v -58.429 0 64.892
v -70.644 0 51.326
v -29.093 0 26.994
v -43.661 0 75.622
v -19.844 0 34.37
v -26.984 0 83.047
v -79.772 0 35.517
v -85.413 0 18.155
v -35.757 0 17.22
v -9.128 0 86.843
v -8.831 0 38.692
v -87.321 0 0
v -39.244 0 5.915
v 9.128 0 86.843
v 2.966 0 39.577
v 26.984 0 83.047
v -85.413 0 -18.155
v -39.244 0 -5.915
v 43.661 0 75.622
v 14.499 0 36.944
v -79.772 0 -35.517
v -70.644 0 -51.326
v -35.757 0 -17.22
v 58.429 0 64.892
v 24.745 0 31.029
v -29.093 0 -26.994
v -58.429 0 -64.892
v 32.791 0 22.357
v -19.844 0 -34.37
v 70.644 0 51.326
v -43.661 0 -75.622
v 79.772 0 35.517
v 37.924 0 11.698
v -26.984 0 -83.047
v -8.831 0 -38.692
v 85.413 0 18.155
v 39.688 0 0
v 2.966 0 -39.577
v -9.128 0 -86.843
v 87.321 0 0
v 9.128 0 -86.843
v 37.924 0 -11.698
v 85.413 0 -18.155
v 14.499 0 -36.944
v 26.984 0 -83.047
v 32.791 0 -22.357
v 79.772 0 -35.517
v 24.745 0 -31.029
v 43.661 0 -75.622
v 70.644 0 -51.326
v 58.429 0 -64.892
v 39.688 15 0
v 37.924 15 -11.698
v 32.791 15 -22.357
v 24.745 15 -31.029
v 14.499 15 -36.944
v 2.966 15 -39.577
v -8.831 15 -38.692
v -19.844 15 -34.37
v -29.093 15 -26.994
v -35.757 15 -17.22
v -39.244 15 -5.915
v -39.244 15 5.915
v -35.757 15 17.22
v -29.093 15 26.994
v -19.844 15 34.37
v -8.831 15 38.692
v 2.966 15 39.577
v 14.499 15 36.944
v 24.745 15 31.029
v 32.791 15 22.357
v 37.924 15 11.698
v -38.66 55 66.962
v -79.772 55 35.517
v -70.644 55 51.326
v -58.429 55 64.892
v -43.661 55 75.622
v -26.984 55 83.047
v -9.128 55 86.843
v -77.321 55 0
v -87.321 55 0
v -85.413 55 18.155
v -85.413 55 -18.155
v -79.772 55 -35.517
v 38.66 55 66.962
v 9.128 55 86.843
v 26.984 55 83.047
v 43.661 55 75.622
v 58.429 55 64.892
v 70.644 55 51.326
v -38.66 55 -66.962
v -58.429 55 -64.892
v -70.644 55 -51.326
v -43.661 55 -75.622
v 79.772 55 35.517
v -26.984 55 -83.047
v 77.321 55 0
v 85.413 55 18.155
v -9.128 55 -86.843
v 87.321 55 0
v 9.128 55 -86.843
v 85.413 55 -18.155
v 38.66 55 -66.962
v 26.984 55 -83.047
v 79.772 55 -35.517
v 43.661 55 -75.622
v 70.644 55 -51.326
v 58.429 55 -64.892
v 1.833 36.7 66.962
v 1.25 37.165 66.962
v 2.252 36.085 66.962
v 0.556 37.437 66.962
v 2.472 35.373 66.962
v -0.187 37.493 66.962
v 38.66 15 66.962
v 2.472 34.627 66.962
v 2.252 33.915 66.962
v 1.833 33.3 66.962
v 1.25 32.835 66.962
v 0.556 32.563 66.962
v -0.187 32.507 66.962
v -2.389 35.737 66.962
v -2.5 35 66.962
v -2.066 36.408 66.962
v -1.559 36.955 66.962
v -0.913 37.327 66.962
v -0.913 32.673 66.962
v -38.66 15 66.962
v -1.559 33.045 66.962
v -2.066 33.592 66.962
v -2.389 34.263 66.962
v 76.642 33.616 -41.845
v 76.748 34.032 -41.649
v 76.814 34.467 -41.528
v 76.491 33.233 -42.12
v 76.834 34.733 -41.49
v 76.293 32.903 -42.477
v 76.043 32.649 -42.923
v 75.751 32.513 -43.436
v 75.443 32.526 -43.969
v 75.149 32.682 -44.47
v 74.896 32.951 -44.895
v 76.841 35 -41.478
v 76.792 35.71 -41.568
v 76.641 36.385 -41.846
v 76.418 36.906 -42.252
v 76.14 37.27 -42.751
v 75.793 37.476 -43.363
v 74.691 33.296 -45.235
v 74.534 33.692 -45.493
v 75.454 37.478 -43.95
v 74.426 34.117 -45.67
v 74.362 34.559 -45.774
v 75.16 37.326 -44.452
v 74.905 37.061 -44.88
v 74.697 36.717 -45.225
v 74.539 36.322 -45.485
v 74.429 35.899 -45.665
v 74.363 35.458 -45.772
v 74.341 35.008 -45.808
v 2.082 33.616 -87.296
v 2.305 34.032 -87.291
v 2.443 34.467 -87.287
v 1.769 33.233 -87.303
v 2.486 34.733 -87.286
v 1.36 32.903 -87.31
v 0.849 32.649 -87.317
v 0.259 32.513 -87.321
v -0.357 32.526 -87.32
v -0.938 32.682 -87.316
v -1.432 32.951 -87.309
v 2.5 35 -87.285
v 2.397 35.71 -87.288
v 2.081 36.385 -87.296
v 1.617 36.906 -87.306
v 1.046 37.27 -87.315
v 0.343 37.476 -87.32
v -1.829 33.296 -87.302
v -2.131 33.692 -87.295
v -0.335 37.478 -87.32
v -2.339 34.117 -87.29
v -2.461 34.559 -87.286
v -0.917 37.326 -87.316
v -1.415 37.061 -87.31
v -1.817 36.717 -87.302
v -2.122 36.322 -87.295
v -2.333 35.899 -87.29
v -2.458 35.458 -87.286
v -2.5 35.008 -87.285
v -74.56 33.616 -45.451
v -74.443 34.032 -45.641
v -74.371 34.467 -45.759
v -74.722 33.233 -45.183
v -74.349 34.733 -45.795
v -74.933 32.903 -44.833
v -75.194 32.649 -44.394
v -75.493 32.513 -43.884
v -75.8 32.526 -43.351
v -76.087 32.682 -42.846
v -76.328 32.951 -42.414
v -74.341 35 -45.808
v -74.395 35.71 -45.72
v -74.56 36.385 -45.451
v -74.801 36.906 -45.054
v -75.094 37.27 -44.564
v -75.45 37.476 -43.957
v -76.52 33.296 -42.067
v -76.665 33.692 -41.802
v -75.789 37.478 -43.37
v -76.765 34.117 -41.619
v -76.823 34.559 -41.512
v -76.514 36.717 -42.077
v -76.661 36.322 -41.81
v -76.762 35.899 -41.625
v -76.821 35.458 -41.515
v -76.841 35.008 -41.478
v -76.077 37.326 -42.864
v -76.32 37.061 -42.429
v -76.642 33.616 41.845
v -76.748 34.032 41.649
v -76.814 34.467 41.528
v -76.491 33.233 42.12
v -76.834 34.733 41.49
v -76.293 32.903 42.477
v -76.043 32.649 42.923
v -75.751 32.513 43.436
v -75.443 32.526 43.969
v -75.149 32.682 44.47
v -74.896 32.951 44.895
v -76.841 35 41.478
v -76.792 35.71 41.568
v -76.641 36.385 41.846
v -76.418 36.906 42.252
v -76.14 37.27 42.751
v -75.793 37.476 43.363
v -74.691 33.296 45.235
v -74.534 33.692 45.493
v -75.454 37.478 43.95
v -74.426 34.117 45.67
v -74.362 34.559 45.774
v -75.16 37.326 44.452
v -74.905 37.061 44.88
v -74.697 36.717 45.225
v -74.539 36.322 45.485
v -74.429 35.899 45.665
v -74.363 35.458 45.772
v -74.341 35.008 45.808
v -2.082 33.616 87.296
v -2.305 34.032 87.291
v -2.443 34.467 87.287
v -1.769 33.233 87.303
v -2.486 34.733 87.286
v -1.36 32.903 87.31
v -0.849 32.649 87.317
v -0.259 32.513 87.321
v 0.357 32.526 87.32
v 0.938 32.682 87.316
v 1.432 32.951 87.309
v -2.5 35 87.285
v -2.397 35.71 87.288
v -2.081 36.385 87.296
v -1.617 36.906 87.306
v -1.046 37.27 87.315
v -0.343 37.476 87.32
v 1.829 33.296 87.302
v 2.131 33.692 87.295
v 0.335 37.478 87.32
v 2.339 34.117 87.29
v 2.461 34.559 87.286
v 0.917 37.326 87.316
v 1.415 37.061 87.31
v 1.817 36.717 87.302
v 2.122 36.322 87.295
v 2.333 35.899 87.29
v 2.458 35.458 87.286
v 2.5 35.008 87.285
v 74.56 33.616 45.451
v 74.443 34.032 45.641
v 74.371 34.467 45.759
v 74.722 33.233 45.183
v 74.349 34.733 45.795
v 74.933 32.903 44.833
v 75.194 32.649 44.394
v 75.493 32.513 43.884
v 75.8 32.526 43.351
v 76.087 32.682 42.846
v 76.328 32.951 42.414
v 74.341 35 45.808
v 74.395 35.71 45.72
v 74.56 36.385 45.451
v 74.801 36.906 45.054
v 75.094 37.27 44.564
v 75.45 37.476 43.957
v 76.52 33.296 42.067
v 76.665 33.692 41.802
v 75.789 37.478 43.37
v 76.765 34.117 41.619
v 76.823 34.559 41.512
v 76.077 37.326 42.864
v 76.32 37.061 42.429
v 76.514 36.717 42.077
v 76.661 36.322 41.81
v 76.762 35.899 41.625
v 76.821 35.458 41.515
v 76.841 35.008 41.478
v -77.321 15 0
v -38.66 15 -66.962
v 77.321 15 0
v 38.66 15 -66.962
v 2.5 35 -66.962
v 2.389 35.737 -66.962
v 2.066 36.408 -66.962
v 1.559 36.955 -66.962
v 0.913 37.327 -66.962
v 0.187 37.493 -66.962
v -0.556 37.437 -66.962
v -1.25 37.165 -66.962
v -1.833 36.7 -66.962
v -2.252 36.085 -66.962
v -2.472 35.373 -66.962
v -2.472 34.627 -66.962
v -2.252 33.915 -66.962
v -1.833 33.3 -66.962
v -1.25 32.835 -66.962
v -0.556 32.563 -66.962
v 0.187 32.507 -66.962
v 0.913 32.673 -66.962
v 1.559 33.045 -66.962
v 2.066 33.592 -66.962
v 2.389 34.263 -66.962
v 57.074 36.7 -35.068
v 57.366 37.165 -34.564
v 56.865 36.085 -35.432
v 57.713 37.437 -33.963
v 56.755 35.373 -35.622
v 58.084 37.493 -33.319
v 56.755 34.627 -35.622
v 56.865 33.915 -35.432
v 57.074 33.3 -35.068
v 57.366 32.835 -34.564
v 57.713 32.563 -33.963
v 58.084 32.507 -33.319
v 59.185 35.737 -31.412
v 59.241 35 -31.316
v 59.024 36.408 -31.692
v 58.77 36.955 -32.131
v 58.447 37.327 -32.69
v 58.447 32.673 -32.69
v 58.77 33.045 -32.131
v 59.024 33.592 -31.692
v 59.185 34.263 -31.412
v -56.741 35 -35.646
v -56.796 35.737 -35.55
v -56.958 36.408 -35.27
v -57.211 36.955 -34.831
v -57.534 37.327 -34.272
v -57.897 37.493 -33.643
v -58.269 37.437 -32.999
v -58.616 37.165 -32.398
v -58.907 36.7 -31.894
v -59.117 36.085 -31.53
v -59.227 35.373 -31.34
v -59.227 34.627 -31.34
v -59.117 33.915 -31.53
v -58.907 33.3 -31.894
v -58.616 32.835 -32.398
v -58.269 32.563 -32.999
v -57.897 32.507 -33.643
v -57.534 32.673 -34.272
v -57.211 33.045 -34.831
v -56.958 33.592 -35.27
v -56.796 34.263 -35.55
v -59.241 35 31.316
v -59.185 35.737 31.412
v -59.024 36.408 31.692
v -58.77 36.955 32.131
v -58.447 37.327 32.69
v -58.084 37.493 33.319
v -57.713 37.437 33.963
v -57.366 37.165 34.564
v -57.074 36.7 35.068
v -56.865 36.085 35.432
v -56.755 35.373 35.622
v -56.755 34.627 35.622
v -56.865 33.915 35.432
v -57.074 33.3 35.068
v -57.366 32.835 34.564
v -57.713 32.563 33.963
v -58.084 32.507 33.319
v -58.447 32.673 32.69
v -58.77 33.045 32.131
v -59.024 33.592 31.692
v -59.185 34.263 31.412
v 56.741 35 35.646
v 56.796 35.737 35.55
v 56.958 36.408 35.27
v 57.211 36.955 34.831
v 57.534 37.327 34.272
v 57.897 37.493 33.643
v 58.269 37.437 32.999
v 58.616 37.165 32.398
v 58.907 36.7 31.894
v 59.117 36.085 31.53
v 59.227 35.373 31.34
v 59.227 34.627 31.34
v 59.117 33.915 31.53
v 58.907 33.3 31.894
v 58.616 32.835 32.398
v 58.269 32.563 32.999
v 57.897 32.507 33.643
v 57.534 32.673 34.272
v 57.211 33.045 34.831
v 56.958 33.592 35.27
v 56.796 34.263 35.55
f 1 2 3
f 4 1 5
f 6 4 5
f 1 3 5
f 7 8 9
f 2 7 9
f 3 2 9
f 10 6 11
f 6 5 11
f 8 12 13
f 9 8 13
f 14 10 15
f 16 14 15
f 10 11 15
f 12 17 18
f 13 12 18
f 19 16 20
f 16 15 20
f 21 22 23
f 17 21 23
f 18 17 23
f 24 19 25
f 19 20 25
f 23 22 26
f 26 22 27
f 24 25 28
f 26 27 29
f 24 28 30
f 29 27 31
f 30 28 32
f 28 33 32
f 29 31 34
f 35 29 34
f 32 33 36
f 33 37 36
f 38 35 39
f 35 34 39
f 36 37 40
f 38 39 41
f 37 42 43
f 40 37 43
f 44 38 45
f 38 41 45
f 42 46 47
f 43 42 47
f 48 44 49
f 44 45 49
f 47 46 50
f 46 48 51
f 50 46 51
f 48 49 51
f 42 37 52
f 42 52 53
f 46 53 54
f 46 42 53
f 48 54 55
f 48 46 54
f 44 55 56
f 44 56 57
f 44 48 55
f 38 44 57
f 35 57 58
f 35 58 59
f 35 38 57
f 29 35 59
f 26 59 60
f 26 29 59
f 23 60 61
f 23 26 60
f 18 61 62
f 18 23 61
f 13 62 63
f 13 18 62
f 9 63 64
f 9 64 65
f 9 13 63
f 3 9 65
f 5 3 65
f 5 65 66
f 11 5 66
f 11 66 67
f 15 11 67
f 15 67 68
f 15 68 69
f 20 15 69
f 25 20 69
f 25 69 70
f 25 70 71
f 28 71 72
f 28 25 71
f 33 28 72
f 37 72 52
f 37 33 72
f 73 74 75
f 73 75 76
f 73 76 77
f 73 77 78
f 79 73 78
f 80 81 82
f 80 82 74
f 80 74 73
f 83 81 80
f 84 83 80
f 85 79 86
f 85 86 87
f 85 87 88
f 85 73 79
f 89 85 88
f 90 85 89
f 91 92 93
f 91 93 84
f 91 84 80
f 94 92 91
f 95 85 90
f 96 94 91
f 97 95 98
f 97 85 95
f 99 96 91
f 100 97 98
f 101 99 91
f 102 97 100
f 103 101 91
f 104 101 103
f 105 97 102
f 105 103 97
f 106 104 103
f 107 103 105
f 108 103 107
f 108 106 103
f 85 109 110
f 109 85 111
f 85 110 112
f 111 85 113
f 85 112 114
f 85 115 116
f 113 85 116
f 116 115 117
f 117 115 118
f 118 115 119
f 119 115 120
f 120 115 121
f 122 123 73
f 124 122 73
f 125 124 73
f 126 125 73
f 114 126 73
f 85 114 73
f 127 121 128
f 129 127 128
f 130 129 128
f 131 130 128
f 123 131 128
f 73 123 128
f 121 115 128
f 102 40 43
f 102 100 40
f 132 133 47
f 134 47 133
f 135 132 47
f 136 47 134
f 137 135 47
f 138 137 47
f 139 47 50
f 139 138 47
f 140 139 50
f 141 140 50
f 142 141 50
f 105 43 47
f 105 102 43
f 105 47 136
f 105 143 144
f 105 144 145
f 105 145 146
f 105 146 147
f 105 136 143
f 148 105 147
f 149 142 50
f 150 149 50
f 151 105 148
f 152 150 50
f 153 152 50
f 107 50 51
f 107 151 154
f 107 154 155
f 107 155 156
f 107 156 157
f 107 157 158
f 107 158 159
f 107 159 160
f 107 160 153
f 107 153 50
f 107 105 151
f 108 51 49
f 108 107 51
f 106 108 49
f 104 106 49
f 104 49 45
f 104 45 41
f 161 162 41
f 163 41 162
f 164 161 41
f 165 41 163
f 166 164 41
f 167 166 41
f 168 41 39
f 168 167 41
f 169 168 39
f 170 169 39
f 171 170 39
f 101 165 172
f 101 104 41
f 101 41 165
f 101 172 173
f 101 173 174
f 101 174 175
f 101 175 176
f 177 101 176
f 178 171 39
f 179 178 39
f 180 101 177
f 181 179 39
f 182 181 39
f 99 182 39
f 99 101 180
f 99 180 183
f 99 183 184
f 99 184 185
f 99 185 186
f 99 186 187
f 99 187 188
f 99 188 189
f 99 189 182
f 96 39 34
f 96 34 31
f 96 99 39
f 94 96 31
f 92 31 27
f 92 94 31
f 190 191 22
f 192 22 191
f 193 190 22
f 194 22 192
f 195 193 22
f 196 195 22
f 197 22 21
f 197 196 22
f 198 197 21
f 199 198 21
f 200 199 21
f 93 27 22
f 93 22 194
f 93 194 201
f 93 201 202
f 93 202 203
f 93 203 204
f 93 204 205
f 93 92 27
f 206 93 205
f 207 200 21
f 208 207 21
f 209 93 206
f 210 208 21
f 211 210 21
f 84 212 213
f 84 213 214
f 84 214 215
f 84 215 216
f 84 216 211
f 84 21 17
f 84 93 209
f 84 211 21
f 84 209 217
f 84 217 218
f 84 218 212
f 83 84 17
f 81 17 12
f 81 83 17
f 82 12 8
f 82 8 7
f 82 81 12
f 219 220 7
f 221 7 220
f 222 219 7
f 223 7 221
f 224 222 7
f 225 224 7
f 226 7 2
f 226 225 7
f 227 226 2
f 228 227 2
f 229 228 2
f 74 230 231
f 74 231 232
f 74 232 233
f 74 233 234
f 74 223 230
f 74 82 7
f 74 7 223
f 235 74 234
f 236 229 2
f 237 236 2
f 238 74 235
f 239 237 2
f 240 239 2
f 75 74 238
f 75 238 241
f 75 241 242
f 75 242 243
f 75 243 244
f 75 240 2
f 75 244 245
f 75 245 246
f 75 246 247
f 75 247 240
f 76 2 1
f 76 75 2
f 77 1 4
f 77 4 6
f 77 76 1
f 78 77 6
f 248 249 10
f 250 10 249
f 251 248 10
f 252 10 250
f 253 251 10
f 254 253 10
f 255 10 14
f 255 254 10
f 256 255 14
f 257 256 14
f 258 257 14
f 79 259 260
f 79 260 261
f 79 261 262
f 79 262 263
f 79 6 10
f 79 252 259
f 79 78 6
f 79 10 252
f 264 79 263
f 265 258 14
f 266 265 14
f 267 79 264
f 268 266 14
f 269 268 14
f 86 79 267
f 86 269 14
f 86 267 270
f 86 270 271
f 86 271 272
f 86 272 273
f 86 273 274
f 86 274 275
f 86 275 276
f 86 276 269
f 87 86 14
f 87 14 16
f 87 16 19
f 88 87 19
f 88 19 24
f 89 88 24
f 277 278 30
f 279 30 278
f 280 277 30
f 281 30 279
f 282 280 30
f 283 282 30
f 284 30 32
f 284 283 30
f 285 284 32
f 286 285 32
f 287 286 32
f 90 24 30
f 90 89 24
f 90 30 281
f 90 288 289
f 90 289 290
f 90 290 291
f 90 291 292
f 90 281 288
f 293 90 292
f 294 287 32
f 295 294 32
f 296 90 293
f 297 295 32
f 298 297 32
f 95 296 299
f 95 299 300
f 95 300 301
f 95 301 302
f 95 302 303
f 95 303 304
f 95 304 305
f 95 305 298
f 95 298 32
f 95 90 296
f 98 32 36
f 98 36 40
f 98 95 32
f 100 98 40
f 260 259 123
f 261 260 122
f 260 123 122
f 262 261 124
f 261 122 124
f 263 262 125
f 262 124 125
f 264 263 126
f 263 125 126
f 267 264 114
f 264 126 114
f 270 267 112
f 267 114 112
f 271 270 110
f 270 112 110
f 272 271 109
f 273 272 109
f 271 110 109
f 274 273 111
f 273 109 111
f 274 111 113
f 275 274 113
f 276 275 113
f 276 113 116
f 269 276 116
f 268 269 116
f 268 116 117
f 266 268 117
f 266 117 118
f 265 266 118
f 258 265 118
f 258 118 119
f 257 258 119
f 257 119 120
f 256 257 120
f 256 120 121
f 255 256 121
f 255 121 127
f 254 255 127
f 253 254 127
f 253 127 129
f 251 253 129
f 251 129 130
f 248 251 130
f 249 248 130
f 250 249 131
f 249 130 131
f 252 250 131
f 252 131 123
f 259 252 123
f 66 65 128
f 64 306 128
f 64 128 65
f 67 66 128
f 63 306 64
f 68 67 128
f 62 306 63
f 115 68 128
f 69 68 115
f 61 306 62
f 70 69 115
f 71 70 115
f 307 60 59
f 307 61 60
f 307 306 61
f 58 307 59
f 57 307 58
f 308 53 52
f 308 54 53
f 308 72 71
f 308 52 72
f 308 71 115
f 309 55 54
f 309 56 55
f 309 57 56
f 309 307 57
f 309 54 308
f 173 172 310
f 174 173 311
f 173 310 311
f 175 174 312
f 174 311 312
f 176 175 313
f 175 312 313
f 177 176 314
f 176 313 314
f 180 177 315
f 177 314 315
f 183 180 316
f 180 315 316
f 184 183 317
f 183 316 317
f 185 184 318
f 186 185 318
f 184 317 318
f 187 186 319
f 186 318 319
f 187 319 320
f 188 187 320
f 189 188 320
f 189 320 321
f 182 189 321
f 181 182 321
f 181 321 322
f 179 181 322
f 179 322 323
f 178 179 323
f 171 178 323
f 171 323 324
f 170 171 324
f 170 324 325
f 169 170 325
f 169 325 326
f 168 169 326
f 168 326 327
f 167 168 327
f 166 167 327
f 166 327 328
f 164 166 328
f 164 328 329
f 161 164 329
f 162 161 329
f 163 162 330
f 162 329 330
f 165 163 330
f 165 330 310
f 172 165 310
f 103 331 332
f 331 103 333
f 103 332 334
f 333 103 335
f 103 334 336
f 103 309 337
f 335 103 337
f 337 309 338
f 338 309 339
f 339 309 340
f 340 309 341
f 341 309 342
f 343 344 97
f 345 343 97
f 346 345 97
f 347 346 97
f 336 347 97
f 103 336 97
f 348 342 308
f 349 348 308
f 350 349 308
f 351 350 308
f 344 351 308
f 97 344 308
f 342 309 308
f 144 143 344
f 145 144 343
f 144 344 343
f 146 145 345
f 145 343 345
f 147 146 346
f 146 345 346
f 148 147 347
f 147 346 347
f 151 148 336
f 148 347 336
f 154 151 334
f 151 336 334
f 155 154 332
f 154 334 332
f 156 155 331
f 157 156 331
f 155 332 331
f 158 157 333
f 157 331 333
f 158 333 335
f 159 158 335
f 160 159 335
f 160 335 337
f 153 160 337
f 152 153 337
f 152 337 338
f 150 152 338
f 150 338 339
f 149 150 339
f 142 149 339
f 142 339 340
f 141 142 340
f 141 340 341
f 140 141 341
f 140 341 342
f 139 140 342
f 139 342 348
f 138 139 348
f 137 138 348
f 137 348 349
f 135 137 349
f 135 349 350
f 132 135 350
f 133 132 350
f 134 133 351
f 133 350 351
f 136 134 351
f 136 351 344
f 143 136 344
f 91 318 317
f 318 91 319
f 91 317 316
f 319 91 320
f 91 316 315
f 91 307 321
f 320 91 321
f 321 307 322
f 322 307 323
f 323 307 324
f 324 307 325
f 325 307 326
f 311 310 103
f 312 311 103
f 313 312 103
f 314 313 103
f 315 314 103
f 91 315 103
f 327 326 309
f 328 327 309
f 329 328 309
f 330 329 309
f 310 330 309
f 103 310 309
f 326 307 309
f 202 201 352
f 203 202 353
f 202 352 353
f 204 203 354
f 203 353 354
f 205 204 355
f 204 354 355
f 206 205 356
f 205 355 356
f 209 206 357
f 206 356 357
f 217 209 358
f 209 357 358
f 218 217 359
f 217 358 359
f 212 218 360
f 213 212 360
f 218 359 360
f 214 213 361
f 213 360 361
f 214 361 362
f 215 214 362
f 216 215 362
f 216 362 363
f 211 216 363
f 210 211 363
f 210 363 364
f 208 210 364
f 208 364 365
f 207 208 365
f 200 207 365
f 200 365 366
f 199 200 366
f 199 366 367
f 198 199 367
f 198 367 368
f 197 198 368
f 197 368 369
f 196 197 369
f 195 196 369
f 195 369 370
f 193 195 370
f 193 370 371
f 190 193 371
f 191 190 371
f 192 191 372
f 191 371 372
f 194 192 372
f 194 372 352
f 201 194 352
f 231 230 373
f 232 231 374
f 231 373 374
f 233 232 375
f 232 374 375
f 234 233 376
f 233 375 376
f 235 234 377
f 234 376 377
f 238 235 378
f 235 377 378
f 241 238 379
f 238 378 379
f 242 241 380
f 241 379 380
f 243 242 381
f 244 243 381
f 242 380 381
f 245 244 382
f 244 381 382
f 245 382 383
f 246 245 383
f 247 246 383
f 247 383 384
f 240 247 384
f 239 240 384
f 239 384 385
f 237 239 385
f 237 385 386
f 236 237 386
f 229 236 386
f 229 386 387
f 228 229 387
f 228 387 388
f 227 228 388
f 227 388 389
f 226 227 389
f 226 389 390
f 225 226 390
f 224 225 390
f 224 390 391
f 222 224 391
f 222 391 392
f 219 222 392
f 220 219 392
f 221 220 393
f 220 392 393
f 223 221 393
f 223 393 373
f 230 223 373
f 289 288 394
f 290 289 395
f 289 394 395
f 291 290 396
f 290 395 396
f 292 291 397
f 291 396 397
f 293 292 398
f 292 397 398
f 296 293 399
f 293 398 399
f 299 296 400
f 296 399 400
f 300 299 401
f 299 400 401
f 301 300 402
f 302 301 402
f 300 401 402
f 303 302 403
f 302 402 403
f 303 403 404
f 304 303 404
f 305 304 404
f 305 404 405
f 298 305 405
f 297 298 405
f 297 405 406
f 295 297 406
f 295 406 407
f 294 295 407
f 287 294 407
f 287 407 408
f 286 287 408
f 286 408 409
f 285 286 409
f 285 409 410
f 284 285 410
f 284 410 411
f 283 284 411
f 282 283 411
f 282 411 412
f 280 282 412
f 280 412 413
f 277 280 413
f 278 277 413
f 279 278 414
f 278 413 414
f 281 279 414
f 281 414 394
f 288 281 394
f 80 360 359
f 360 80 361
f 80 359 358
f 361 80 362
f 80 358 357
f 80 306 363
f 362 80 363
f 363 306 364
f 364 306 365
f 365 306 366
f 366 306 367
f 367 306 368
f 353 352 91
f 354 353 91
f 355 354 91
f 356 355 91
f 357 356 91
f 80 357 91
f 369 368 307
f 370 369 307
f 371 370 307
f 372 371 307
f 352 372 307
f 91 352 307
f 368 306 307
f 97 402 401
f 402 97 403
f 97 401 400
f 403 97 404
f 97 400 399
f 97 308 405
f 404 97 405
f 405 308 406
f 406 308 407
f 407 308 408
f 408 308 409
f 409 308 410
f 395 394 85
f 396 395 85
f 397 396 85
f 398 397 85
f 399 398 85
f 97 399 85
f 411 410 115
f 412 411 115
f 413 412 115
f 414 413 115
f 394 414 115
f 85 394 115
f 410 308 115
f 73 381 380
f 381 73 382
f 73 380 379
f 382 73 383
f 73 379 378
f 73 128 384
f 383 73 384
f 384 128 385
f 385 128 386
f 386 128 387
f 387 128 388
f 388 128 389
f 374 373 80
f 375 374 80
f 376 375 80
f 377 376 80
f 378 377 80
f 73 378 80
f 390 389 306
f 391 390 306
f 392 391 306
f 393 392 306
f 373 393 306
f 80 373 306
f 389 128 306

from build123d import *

# Parameters (mm, degrees)
SKETCH1_R                = 77.321
SKETCH1_R_2              = 39.6875
BOSS_EXTRUDE1_DEPTH      = 15
SKETCH2_R                = 87.321
SKETCH2_R_2              = 77.321
BOSS_EXTRUDE2_DEPTH      = 40
BOSS_EXTRUDE2_DEPTH_BACK = 15
BOSS_EXTRUDE3_DEPTH      = 40
SKETCH4_R                = 2.5
CUT_EXTRUDE1_DEPTH       = 21.359049754
CIRPATTERN1_COUNT        = 6


with BuildPart() as part:
    # Sketch1 → Boss-Extrude1 (new body)
    with BuildSketch(Plane(origin=(0, 0, 0), x_dir=(1, 0, 0), z_dir=(0, 1, 0))):
        Circle(SKETCH1_R)
        Circle(SKETCH1_R_2, mode=Mode.SUBTRACT)
    extrude(amount=BOSS_EXTRUDE1_DEPTH)

    # Sketch2 → Boss-Extrude2 (add, two sides)
    with BuildSketch(Plane(origin=(0, 15, 0), x_dir=(1, 0, 0), z_dir=(0, 1, 0))) as boss_extrude2_sk:
        Circle(SKETCH2_R)
        Circle(SKETCH2_R_2, mode=Mode.SUBTRACT)
    extrude(amount=BOSS_EXTRUDE2_DEPTH)
    extrude(boss_extrude2_sk.sketch, amount=-BOSS_EXTRUDE2_DEPTH_BACK)

    # Sketch3 → Boss-Extrude3 (add)
    with BuildSketch(Plane(origin=(0, 15, 0), x_dir=(1, 0, 0), z_dir=(0, 1, 0))):
        with BuildLine():
            ThreePointArc((-77.321, 0), (-66.961950246, -38.6605), (-38.6605, -66.961950246))
            Line((-38.6605, -66.961950246), (-77.321, 0))
        make_face()
        with BuildLine():
            Line((-77.321, 0), (-38.6605, 66.961950246))
            ThreePointArc((-38.6605, 66.961950246), (-66.961950246, 38.6605), (-77.321, 0))
        make_face()
        with BuildLine():
            Line((-38.6605, 66.961950246), (38.6605, 66.961950246))
            ThreePointArc((38.6605, 66.961950246), (0, 77.321), (-38.6605, 66.961950246))
        make_face()
        with BuildLine():
            Line((38.6605, 66.961950246), (77.321, 0))
            ThreePointArc((77.321, 0), (66.961950246, 38.6605), (38.6605, 66.961950246))
        make_face()
        with BuildLine():
            ThreePointArc((38.6605, -66.961950246), (66.961950246, -38.6605), (77.321, 0))
            Line((77.321, 0), (38.6605, -66.961950246))
        make_face()
        with BuildLine():
            ThreePointArc((-38.6605, -66.961950246), (0, -77.321), (38.6605, -66.961950246))
            Line((38.6605, -66.961950246), (-38.6605, -66.961950246))
        make_face()
    extrude(amount=BOSS_EXTRUDE3_DEPTH)

    # Sketch4 → Cut-Extrude1 (cut, through all)
    with BuildSketch(Plane.XY.offset(-66.961950246)):
        with Locations((0, 35)):
            Circle(SKETCH4_R)
    cut_extrude1 = extrude(amount=-CUT_EXTRUDE1_DEPTH, mode=Mode.SUBTRACT)

    # CirPattern1: Cut-Extrude1 ×6 about axis
    cirpattern1_axis = Axis((0, -246.98108496, 0), (0, 1, 0))
    for i in range(1, CIRPATTERN1_COUNT):
        add(cut_extrude1.rotate(cirpattern1_axis, i * 360 / CIRPATTERN1_COUNT), mode=Mode.SUBTRACT)


solid = part.part
